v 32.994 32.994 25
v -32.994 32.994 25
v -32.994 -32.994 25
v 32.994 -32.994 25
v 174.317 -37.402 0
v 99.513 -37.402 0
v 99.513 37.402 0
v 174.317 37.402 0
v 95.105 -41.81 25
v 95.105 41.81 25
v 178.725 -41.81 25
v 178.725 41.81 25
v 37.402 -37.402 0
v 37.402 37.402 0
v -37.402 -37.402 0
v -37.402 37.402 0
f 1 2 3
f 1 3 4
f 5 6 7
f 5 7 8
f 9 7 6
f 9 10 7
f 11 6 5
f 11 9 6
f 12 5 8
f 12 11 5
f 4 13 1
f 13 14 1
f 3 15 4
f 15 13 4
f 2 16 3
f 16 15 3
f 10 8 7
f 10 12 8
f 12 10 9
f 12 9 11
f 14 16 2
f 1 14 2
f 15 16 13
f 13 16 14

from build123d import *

# Parameters (mm, degrees)
F0_W     = 74.8037864
F0_H     = 74.8037864
F1_DEPTH = 25
F1_TAPER = 10
F2_DEPTH = 25
F2_TAPER = -10


with BuildPart() as f1:
    # F0 (on Top) → F1 (new body)
    with BuildSketch(Plane.XY):
        Rectangle(F0_W, F0_H)
    extrude(amount=F1_DEPTH, taper=F1_TAPER)


with BuildPart() as f2:
    # F0 (on Top) → F2 (new body)
    with BuildSketch(Plane.XY):
        with Locations((136.9150643929, 0)):
            Rectangle(F0_W, F0_H)
    extrude(amount=F2_DEPTH, taper=F2_TAPER)


solid = Compound([f1.part, f2.part])
